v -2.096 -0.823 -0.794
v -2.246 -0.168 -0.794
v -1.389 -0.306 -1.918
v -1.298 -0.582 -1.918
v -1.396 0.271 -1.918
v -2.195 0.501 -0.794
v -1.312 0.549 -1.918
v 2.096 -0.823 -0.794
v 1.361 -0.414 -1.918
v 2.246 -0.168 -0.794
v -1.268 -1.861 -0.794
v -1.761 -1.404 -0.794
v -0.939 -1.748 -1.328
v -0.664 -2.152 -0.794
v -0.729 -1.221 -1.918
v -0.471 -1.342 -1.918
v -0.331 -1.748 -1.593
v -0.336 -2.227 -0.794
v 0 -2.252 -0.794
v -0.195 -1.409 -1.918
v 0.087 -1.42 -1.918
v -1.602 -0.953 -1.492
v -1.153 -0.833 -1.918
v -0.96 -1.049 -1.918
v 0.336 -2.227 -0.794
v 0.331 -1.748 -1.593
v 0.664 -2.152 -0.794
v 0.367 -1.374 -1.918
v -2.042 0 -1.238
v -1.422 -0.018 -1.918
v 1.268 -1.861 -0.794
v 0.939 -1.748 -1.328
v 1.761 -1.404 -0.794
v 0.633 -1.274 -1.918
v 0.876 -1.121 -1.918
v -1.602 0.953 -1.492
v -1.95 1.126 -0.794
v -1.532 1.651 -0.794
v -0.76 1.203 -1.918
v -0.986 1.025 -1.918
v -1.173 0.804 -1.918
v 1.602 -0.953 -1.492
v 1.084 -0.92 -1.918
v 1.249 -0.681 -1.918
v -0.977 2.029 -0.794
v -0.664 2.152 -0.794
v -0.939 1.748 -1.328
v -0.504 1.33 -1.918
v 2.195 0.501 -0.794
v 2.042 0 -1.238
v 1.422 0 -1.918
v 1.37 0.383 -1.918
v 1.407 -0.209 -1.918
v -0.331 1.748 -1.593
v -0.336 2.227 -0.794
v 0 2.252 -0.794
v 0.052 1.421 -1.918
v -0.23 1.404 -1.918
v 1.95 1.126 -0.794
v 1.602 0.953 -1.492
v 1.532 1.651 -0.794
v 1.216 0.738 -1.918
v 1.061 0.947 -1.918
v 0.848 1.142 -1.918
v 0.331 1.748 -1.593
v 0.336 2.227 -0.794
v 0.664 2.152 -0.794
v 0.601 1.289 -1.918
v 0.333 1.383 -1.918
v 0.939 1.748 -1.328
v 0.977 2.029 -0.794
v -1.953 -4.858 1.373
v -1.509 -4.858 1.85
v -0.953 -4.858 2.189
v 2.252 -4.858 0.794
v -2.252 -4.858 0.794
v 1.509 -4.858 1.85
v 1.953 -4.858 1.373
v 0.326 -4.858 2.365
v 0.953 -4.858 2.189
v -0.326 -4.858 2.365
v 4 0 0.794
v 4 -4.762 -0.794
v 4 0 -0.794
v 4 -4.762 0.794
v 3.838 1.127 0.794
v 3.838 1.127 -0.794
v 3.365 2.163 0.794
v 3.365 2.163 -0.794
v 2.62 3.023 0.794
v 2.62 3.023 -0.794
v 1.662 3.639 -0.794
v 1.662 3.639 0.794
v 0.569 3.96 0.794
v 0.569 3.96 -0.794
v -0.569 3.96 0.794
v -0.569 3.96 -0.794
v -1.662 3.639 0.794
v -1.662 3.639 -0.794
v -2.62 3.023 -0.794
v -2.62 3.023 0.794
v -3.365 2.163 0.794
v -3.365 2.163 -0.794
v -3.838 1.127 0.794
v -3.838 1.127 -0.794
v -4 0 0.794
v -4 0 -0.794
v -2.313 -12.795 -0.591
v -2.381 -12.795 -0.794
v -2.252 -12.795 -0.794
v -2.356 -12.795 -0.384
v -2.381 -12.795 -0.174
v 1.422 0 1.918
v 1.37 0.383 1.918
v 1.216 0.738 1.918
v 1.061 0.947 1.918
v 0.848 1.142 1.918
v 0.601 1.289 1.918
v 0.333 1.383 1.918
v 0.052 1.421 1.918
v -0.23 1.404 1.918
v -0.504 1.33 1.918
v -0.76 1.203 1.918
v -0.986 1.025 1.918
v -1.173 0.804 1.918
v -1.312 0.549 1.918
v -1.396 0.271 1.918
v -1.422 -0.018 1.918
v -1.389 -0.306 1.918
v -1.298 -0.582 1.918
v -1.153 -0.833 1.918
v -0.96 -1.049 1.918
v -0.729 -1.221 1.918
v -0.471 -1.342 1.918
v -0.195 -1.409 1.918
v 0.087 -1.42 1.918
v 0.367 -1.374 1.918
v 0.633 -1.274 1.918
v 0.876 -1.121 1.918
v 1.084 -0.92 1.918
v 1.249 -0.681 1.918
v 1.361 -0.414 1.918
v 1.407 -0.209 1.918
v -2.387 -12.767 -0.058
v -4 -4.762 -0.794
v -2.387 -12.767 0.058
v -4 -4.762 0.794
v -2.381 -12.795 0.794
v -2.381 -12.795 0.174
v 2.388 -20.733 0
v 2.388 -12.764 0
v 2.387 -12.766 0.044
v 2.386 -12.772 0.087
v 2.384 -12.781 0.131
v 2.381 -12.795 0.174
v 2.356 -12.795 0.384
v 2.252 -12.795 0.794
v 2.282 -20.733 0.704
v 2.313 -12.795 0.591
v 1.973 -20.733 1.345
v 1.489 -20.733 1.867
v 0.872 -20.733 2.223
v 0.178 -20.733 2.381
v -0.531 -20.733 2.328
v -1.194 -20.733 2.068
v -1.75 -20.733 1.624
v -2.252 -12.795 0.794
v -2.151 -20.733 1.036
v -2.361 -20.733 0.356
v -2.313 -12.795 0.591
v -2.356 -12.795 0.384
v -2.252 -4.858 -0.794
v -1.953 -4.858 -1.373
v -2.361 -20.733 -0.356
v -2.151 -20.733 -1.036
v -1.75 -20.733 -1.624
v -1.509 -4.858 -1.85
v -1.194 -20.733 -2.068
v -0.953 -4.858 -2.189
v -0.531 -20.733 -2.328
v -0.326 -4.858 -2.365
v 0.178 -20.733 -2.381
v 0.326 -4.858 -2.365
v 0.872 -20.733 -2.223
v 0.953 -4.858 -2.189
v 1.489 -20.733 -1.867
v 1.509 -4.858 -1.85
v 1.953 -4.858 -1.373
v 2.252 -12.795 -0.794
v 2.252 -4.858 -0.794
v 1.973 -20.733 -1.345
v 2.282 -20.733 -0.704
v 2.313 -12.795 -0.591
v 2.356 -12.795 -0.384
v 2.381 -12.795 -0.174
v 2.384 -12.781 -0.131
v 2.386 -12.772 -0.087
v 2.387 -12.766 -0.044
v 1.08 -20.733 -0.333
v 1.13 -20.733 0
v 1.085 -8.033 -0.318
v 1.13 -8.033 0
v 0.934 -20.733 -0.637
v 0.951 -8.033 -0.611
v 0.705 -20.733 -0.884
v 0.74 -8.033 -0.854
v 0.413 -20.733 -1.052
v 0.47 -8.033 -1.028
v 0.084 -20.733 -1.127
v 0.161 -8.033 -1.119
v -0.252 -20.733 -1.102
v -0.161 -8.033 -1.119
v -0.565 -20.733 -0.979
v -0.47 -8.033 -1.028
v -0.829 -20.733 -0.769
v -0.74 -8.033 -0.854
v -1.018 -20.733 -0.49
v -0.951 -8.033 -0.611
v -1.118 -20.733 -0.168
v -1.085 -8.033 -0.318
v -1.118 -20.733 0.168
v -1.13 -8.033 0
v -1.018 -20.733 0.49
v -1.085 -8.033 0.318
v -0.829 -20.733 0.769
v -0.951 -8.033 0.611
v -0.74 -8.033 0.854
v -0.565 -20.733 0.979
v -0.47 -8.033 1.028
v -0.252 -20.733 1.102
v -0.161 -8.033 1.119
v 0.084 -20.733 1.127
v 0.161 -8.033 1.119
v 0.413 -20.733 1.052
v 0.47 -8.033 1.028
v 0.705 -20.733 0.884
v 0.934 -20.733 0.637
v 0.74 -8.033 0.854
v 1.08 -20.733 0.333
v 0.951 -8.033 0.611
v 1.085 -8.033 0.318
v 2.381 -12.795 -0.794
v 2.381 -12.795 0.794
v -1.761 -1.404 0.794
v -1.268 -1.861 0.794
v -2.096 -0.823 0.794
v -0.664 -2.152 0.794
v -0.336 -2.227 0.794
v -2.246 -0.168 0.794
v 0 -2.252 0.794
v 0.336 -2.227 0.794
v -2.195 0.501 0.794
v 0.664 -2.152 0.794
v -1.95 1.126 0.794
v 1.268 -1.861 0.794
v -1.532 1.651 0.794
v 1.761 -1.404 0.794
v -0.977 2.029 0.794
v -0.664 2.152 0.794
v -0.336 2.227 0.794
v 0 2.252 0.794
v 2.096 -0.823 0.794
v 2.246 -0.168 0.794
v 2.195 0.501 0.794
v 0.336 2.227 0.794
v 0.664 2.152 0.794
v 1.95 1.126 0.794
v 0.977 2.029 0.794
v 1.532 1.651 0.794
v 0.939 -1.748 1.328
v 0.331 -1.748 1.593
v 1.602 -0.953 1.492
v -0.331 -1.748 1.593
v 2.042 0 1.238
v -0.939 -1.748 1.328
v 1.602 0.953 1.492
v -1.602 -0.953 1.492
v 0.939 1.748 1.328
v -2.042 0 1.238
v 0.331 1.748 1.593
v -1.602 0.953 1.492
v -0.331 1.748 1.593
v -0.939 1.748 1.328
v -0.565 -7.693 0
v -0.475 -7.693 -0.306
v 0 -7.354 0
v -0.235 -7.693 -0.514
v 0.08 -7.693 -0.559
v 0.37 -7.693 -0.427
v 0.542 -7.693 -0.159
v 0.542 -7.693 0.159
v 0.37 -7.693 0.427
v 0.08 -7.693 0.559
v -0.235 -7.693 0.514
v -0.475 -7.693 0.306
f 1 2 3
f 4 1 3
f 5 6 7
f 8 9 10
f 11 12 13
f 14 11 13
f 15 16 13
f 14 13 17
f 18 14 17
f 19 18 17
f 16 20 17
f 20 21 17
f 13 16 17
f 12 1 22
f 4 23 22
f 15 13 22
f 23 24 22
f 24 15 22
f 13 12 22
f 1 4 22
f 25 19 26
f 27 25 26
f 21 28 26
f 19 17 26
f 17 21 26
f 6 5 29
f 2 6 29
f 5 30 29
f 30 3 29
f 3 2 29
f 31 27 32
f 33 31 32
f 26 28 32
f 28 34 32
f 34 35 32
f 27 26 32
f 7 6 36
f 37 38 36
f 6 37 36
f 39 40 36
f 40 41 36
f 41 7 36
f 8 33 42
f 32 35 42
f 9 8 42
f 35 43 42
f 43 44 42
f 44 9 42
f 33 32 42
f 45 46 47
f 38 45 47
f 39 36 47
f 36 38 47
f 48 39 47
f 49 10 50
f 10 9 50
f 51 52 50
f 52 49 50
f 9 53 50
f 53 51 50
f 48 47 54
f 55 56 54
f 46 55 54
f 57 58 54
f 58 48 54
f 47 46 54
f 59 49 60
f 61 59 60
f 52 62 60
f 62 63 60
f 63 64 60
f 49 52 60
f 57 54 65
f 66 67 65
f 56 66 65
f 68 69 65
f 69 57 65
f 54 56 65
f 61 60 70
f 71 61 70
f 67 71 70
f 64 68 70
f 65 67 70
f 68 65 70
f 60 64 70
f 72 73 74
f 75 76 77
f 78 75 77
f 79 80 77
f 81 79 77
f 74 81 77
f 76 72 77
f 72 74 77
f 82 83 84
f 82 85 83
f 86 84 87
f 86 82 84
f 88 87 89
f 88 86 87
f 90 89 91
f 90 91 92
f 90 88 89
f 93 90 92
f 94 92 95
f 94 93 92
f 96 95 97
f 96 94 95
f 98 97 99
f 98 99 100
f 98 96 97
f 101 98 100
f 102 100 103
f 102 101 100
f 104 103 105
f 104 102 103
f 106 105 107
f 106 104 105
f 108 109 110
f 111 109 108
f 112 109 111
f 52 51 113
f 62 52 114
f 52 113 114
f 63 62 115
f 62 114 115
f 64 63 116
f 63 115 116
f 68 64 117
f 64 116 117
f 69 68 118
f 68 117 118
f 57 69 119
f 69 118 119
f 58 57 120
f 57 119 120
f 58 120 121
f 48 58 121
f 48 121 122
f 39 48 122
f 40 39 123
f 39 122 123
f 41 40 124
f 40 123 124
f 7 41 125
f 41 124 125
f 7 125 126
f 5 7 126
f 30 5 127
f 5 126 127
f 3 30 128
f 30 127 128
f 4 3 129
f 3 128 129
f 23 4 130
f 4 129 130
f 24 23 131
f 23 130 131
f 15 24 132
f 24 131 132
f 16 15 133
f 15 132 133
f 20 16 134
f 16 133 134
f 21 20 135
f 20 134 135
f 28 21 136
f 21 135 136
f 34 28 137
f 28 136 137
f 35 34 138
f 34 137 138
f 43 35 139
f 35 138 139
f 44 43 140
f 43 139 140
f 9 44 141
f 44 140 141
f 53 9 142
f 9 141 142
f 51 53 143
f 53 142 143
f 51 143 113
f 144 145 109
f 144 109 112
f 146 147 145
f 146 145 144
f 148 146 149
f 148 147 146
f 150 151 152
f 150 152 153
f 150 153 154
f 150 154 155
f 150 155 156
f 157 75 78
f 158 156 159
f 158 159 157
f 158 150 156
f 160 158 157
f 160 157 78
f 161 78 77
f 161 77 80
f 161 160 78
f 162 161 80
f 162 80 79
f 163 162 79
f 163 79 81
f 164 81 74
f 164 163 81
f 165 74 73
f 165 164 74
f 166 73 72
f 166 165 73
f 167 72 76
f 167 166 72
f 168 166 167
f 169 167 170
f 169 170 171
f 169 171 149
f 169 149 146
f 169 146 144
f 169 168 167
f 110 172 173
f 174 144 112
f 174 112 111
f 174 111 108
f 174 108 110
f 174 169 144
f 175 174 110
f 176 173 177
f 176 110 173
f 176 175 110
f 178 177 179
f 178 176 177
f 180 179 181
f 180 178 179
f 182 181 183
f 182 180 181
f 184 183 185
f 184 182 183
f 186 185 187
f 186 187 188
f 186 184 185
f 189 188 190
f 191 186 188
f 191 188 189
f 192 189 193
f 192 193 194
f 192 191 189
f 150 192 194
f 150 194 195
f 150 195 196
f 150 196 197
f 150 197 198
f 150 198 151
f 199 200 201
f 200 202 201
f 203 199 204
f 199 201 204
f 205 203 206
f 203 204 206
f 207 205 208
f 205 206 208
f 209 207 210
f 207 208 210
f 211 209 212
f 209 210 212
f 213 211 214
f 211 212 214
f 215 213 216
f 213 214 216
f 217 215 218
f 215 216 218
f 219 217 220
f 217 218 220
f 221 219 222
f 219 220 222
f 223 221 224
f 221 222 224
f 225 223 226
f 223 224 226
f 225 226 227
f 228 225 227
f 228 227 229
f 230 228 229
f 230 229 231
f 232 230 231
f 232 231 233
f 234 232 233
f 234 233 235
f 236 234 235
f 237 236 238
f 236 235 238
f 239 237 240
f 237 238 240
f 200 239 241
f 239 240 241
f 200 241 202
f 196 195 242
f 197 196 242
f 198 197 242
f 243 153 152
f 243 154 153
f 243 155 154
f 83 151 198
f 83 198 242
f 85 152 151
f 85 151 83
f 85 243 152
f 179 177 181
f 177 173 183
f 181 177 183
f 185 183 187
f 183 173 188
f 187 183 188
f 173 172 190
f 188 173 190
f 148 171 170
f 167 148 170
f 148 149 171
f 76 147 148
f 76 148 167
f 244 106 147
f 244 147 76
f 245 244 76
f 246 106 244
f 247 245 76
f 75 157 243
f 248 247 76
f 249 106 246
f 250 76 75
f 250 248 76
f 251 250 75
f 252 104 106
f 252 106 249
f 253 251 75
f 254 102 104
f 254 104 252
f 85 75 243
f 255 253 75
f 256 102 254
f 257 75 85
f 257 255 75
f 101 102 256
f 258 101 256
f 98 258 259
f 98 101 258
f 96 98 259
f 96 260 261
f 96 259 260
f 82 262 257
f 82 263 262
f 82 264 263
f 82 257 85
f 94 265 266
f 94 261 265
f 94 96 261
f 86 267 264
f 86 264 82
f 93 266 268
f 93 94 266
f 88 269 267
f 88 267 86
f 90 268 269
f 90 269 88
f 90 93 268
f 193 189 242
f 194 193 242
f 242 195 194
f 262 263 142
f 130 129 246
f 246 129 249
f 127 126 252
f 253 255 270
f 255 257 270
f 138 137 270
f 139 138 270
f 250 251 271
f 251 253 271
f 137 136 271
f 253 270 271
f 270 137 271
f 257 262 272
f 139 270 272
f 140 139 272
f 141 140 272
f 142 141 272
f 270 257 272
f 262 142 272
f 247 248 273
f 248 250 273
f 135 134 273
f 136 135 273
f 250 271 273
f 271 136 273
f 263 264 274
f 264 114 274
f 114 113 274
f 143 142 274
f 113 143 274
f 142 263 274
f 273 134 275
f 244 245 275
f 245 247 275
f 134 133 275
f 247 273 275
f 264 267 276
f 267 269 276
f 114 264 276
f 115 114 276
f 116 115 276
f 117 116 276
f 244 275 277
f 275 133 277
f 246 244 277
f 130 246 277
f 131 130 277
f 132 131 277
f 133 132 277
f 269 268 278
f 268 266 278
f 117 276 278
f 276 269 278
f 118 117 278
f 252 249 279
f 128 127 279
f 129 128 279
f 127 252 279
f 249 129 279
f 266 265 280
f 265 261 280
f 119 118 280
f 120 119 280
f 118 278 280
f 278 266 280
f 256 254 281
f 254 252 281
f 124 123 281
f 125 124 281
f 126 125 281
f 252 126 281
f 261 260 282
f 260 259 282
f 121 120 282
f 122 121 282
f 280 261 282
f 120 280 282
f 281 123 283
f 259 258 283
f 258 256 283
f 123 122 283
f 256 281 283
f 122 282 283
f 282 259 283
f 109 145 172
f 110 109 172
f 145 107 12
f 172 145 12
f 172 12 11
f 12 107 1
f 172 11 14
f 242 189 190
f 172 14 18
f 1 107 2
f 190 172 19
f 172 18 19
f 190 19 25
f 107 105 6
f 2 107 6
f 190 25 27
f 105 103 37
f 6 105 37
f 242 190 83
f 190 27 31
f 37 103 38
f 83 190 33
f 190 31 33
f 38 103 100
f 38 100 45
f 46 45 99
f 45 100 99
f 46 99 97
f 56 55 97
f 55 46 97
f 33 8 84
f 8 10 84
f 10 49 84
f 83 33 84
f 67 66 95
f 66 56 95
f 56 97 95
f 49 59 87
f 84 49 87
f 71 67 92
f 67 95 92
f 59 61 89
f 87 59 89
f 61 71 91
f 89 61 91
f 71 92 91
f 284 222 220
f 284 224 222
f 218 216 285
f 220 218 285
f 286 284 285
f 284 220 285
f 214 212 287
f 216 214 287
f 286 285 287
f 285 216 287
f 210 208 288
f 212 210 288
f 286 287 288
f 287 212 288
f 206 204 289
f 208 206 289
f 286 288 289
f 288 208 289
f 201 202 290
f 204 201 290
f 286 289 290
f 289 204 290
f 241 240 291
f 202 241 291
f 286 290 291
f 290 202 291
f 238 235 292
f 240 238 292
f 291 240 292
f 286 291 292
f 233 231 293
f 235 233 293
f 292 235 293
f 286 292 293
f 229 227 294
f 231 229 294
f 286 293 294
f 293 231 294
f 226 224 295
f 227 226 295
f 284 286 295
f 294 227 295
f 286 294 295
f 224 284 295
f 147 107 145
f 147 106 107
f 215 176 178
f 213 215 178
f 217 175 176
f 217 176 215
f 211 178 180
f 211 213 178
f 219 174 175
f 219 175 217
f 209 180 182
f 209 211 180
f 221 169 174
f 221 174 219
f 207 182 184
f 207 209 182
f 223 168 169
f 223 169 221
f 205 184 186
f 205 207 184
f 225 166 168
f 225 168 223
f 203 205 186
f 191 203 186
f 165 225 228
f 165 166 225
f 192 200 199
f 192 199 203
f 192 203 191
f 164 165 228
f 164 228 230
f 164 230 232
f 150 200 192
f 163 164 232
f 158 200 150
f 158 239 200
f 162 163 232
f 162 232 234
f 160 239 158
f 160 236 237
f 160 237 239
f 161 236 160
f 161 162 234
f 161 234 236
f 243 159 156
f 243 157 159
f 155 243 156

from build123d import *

# Parameters (mm, degrees)
SKETCH3_R                 = 1.4224
CUT_EXTRUDE1_DEPTH        = 3.3876
CUT_EXTRUDE1_DEPTH_BACK   = 3.3876
SKETCH4_R                 = 1.4224
BOSS_EXTRUDE1_DEPTH       = 0.79375
SKETCH5_R                 = 2.3876
BOSS_EXTRUDE2_DEPTH       = 7.9375
F_4_40_TAPPED_HOLE1_D     = 2.2606
F_4_40_TAPPED_HOLE1_DEPTH = 12.7
F_4_40_TAPPED_HOLE1_TIP   = 0.679152758


with BuildPart() as part:
    # Sketch2 → Revolve1 (revolve)
    with BuildSketch(Plane.XY):
        with BuildLine():
            Line((0, 2.3876), (0, -2.3876))
            ThreePointArc((0, -2.3876), (2.3876, 0), (0, 2.3876))
        make_face()
    revolve(axis=Axis((0, 6.043929029, 0), (0, -1, 0)))

    # Sketch3 → Cut-Extrude1 (cut, two sides)
    with BuildSketch(Plane.XY) as cut_extrude1_sk:
        Circle(SKETCH3_R)
    extrude(amount=CUT_EXTRUDE1_DEPTH, mode=Mode.SUBTRACT)
    extrude(cut_extrude1_sk.sketch, amount=-CUT_EXTRUDE1_DEPTH_BACK, mode=Mode.SUBTRACT)

    # Sketch4 → Boss-Extrude1 (add, symmetric)
    with BuildSketch(Plane.XY):
        with BuildLine():
            Line((-4.0005, 0), (-4.0005, -4.7625))
            Line((-4.0005, -4.7625), (-2.38125, -12.79525))
            Line((-2.38125, -12.79525), (2.38125, -12.79525))
            Line((2.38125, -12.79525), (4.0005, -4.7625))
            Line((4.0005, -4.7625), (4.0005, 0))
            ThreePointArc((4.0005, 0), (0, 4.0005), (-4.0005, 0))
        make_face()
        Circle(SKETCH4_R, mode=Mode.SUBTRACT)
    extrude(amount=BOSS_EXTRUDE1_DEPTH, both=True)

    # Sketch5 → Boss-Extrude2 (add, symmetric)
    with BuildSketch(Plane.XZ.offset(12.79525)):
        Circle(SKETCH5_R)
    extrude(amount=BOSS_EXTRUDE2_DEPTH, both=True)

    # #4-40 Tapped Hole1
    with Locations(Plane(origin=(0, -20.73275, 0), x_dir=(-1, 0, 0), z_dir=(0, -1, 0))):
        with Locations((0, 0)):
            Hole(F_4_40_TAPPED_HOLE1_D / 2, depth=F_4_40_TAPPED_HOLE1_DEPTH)
            with Locations((0, 0, -(F_4_40_TAPPED_HOLE1_DEPTH + F_4_40_TAPPED_HOLE1_TIP / 2))):  # 118° drill point
                Cone(0, F_4_40_TAPPED_HOLE1_D / 2, F_4_40_TAPPED_HOLE1_TIP, mode=Mode.SUBTRACT)


solid = part.part
